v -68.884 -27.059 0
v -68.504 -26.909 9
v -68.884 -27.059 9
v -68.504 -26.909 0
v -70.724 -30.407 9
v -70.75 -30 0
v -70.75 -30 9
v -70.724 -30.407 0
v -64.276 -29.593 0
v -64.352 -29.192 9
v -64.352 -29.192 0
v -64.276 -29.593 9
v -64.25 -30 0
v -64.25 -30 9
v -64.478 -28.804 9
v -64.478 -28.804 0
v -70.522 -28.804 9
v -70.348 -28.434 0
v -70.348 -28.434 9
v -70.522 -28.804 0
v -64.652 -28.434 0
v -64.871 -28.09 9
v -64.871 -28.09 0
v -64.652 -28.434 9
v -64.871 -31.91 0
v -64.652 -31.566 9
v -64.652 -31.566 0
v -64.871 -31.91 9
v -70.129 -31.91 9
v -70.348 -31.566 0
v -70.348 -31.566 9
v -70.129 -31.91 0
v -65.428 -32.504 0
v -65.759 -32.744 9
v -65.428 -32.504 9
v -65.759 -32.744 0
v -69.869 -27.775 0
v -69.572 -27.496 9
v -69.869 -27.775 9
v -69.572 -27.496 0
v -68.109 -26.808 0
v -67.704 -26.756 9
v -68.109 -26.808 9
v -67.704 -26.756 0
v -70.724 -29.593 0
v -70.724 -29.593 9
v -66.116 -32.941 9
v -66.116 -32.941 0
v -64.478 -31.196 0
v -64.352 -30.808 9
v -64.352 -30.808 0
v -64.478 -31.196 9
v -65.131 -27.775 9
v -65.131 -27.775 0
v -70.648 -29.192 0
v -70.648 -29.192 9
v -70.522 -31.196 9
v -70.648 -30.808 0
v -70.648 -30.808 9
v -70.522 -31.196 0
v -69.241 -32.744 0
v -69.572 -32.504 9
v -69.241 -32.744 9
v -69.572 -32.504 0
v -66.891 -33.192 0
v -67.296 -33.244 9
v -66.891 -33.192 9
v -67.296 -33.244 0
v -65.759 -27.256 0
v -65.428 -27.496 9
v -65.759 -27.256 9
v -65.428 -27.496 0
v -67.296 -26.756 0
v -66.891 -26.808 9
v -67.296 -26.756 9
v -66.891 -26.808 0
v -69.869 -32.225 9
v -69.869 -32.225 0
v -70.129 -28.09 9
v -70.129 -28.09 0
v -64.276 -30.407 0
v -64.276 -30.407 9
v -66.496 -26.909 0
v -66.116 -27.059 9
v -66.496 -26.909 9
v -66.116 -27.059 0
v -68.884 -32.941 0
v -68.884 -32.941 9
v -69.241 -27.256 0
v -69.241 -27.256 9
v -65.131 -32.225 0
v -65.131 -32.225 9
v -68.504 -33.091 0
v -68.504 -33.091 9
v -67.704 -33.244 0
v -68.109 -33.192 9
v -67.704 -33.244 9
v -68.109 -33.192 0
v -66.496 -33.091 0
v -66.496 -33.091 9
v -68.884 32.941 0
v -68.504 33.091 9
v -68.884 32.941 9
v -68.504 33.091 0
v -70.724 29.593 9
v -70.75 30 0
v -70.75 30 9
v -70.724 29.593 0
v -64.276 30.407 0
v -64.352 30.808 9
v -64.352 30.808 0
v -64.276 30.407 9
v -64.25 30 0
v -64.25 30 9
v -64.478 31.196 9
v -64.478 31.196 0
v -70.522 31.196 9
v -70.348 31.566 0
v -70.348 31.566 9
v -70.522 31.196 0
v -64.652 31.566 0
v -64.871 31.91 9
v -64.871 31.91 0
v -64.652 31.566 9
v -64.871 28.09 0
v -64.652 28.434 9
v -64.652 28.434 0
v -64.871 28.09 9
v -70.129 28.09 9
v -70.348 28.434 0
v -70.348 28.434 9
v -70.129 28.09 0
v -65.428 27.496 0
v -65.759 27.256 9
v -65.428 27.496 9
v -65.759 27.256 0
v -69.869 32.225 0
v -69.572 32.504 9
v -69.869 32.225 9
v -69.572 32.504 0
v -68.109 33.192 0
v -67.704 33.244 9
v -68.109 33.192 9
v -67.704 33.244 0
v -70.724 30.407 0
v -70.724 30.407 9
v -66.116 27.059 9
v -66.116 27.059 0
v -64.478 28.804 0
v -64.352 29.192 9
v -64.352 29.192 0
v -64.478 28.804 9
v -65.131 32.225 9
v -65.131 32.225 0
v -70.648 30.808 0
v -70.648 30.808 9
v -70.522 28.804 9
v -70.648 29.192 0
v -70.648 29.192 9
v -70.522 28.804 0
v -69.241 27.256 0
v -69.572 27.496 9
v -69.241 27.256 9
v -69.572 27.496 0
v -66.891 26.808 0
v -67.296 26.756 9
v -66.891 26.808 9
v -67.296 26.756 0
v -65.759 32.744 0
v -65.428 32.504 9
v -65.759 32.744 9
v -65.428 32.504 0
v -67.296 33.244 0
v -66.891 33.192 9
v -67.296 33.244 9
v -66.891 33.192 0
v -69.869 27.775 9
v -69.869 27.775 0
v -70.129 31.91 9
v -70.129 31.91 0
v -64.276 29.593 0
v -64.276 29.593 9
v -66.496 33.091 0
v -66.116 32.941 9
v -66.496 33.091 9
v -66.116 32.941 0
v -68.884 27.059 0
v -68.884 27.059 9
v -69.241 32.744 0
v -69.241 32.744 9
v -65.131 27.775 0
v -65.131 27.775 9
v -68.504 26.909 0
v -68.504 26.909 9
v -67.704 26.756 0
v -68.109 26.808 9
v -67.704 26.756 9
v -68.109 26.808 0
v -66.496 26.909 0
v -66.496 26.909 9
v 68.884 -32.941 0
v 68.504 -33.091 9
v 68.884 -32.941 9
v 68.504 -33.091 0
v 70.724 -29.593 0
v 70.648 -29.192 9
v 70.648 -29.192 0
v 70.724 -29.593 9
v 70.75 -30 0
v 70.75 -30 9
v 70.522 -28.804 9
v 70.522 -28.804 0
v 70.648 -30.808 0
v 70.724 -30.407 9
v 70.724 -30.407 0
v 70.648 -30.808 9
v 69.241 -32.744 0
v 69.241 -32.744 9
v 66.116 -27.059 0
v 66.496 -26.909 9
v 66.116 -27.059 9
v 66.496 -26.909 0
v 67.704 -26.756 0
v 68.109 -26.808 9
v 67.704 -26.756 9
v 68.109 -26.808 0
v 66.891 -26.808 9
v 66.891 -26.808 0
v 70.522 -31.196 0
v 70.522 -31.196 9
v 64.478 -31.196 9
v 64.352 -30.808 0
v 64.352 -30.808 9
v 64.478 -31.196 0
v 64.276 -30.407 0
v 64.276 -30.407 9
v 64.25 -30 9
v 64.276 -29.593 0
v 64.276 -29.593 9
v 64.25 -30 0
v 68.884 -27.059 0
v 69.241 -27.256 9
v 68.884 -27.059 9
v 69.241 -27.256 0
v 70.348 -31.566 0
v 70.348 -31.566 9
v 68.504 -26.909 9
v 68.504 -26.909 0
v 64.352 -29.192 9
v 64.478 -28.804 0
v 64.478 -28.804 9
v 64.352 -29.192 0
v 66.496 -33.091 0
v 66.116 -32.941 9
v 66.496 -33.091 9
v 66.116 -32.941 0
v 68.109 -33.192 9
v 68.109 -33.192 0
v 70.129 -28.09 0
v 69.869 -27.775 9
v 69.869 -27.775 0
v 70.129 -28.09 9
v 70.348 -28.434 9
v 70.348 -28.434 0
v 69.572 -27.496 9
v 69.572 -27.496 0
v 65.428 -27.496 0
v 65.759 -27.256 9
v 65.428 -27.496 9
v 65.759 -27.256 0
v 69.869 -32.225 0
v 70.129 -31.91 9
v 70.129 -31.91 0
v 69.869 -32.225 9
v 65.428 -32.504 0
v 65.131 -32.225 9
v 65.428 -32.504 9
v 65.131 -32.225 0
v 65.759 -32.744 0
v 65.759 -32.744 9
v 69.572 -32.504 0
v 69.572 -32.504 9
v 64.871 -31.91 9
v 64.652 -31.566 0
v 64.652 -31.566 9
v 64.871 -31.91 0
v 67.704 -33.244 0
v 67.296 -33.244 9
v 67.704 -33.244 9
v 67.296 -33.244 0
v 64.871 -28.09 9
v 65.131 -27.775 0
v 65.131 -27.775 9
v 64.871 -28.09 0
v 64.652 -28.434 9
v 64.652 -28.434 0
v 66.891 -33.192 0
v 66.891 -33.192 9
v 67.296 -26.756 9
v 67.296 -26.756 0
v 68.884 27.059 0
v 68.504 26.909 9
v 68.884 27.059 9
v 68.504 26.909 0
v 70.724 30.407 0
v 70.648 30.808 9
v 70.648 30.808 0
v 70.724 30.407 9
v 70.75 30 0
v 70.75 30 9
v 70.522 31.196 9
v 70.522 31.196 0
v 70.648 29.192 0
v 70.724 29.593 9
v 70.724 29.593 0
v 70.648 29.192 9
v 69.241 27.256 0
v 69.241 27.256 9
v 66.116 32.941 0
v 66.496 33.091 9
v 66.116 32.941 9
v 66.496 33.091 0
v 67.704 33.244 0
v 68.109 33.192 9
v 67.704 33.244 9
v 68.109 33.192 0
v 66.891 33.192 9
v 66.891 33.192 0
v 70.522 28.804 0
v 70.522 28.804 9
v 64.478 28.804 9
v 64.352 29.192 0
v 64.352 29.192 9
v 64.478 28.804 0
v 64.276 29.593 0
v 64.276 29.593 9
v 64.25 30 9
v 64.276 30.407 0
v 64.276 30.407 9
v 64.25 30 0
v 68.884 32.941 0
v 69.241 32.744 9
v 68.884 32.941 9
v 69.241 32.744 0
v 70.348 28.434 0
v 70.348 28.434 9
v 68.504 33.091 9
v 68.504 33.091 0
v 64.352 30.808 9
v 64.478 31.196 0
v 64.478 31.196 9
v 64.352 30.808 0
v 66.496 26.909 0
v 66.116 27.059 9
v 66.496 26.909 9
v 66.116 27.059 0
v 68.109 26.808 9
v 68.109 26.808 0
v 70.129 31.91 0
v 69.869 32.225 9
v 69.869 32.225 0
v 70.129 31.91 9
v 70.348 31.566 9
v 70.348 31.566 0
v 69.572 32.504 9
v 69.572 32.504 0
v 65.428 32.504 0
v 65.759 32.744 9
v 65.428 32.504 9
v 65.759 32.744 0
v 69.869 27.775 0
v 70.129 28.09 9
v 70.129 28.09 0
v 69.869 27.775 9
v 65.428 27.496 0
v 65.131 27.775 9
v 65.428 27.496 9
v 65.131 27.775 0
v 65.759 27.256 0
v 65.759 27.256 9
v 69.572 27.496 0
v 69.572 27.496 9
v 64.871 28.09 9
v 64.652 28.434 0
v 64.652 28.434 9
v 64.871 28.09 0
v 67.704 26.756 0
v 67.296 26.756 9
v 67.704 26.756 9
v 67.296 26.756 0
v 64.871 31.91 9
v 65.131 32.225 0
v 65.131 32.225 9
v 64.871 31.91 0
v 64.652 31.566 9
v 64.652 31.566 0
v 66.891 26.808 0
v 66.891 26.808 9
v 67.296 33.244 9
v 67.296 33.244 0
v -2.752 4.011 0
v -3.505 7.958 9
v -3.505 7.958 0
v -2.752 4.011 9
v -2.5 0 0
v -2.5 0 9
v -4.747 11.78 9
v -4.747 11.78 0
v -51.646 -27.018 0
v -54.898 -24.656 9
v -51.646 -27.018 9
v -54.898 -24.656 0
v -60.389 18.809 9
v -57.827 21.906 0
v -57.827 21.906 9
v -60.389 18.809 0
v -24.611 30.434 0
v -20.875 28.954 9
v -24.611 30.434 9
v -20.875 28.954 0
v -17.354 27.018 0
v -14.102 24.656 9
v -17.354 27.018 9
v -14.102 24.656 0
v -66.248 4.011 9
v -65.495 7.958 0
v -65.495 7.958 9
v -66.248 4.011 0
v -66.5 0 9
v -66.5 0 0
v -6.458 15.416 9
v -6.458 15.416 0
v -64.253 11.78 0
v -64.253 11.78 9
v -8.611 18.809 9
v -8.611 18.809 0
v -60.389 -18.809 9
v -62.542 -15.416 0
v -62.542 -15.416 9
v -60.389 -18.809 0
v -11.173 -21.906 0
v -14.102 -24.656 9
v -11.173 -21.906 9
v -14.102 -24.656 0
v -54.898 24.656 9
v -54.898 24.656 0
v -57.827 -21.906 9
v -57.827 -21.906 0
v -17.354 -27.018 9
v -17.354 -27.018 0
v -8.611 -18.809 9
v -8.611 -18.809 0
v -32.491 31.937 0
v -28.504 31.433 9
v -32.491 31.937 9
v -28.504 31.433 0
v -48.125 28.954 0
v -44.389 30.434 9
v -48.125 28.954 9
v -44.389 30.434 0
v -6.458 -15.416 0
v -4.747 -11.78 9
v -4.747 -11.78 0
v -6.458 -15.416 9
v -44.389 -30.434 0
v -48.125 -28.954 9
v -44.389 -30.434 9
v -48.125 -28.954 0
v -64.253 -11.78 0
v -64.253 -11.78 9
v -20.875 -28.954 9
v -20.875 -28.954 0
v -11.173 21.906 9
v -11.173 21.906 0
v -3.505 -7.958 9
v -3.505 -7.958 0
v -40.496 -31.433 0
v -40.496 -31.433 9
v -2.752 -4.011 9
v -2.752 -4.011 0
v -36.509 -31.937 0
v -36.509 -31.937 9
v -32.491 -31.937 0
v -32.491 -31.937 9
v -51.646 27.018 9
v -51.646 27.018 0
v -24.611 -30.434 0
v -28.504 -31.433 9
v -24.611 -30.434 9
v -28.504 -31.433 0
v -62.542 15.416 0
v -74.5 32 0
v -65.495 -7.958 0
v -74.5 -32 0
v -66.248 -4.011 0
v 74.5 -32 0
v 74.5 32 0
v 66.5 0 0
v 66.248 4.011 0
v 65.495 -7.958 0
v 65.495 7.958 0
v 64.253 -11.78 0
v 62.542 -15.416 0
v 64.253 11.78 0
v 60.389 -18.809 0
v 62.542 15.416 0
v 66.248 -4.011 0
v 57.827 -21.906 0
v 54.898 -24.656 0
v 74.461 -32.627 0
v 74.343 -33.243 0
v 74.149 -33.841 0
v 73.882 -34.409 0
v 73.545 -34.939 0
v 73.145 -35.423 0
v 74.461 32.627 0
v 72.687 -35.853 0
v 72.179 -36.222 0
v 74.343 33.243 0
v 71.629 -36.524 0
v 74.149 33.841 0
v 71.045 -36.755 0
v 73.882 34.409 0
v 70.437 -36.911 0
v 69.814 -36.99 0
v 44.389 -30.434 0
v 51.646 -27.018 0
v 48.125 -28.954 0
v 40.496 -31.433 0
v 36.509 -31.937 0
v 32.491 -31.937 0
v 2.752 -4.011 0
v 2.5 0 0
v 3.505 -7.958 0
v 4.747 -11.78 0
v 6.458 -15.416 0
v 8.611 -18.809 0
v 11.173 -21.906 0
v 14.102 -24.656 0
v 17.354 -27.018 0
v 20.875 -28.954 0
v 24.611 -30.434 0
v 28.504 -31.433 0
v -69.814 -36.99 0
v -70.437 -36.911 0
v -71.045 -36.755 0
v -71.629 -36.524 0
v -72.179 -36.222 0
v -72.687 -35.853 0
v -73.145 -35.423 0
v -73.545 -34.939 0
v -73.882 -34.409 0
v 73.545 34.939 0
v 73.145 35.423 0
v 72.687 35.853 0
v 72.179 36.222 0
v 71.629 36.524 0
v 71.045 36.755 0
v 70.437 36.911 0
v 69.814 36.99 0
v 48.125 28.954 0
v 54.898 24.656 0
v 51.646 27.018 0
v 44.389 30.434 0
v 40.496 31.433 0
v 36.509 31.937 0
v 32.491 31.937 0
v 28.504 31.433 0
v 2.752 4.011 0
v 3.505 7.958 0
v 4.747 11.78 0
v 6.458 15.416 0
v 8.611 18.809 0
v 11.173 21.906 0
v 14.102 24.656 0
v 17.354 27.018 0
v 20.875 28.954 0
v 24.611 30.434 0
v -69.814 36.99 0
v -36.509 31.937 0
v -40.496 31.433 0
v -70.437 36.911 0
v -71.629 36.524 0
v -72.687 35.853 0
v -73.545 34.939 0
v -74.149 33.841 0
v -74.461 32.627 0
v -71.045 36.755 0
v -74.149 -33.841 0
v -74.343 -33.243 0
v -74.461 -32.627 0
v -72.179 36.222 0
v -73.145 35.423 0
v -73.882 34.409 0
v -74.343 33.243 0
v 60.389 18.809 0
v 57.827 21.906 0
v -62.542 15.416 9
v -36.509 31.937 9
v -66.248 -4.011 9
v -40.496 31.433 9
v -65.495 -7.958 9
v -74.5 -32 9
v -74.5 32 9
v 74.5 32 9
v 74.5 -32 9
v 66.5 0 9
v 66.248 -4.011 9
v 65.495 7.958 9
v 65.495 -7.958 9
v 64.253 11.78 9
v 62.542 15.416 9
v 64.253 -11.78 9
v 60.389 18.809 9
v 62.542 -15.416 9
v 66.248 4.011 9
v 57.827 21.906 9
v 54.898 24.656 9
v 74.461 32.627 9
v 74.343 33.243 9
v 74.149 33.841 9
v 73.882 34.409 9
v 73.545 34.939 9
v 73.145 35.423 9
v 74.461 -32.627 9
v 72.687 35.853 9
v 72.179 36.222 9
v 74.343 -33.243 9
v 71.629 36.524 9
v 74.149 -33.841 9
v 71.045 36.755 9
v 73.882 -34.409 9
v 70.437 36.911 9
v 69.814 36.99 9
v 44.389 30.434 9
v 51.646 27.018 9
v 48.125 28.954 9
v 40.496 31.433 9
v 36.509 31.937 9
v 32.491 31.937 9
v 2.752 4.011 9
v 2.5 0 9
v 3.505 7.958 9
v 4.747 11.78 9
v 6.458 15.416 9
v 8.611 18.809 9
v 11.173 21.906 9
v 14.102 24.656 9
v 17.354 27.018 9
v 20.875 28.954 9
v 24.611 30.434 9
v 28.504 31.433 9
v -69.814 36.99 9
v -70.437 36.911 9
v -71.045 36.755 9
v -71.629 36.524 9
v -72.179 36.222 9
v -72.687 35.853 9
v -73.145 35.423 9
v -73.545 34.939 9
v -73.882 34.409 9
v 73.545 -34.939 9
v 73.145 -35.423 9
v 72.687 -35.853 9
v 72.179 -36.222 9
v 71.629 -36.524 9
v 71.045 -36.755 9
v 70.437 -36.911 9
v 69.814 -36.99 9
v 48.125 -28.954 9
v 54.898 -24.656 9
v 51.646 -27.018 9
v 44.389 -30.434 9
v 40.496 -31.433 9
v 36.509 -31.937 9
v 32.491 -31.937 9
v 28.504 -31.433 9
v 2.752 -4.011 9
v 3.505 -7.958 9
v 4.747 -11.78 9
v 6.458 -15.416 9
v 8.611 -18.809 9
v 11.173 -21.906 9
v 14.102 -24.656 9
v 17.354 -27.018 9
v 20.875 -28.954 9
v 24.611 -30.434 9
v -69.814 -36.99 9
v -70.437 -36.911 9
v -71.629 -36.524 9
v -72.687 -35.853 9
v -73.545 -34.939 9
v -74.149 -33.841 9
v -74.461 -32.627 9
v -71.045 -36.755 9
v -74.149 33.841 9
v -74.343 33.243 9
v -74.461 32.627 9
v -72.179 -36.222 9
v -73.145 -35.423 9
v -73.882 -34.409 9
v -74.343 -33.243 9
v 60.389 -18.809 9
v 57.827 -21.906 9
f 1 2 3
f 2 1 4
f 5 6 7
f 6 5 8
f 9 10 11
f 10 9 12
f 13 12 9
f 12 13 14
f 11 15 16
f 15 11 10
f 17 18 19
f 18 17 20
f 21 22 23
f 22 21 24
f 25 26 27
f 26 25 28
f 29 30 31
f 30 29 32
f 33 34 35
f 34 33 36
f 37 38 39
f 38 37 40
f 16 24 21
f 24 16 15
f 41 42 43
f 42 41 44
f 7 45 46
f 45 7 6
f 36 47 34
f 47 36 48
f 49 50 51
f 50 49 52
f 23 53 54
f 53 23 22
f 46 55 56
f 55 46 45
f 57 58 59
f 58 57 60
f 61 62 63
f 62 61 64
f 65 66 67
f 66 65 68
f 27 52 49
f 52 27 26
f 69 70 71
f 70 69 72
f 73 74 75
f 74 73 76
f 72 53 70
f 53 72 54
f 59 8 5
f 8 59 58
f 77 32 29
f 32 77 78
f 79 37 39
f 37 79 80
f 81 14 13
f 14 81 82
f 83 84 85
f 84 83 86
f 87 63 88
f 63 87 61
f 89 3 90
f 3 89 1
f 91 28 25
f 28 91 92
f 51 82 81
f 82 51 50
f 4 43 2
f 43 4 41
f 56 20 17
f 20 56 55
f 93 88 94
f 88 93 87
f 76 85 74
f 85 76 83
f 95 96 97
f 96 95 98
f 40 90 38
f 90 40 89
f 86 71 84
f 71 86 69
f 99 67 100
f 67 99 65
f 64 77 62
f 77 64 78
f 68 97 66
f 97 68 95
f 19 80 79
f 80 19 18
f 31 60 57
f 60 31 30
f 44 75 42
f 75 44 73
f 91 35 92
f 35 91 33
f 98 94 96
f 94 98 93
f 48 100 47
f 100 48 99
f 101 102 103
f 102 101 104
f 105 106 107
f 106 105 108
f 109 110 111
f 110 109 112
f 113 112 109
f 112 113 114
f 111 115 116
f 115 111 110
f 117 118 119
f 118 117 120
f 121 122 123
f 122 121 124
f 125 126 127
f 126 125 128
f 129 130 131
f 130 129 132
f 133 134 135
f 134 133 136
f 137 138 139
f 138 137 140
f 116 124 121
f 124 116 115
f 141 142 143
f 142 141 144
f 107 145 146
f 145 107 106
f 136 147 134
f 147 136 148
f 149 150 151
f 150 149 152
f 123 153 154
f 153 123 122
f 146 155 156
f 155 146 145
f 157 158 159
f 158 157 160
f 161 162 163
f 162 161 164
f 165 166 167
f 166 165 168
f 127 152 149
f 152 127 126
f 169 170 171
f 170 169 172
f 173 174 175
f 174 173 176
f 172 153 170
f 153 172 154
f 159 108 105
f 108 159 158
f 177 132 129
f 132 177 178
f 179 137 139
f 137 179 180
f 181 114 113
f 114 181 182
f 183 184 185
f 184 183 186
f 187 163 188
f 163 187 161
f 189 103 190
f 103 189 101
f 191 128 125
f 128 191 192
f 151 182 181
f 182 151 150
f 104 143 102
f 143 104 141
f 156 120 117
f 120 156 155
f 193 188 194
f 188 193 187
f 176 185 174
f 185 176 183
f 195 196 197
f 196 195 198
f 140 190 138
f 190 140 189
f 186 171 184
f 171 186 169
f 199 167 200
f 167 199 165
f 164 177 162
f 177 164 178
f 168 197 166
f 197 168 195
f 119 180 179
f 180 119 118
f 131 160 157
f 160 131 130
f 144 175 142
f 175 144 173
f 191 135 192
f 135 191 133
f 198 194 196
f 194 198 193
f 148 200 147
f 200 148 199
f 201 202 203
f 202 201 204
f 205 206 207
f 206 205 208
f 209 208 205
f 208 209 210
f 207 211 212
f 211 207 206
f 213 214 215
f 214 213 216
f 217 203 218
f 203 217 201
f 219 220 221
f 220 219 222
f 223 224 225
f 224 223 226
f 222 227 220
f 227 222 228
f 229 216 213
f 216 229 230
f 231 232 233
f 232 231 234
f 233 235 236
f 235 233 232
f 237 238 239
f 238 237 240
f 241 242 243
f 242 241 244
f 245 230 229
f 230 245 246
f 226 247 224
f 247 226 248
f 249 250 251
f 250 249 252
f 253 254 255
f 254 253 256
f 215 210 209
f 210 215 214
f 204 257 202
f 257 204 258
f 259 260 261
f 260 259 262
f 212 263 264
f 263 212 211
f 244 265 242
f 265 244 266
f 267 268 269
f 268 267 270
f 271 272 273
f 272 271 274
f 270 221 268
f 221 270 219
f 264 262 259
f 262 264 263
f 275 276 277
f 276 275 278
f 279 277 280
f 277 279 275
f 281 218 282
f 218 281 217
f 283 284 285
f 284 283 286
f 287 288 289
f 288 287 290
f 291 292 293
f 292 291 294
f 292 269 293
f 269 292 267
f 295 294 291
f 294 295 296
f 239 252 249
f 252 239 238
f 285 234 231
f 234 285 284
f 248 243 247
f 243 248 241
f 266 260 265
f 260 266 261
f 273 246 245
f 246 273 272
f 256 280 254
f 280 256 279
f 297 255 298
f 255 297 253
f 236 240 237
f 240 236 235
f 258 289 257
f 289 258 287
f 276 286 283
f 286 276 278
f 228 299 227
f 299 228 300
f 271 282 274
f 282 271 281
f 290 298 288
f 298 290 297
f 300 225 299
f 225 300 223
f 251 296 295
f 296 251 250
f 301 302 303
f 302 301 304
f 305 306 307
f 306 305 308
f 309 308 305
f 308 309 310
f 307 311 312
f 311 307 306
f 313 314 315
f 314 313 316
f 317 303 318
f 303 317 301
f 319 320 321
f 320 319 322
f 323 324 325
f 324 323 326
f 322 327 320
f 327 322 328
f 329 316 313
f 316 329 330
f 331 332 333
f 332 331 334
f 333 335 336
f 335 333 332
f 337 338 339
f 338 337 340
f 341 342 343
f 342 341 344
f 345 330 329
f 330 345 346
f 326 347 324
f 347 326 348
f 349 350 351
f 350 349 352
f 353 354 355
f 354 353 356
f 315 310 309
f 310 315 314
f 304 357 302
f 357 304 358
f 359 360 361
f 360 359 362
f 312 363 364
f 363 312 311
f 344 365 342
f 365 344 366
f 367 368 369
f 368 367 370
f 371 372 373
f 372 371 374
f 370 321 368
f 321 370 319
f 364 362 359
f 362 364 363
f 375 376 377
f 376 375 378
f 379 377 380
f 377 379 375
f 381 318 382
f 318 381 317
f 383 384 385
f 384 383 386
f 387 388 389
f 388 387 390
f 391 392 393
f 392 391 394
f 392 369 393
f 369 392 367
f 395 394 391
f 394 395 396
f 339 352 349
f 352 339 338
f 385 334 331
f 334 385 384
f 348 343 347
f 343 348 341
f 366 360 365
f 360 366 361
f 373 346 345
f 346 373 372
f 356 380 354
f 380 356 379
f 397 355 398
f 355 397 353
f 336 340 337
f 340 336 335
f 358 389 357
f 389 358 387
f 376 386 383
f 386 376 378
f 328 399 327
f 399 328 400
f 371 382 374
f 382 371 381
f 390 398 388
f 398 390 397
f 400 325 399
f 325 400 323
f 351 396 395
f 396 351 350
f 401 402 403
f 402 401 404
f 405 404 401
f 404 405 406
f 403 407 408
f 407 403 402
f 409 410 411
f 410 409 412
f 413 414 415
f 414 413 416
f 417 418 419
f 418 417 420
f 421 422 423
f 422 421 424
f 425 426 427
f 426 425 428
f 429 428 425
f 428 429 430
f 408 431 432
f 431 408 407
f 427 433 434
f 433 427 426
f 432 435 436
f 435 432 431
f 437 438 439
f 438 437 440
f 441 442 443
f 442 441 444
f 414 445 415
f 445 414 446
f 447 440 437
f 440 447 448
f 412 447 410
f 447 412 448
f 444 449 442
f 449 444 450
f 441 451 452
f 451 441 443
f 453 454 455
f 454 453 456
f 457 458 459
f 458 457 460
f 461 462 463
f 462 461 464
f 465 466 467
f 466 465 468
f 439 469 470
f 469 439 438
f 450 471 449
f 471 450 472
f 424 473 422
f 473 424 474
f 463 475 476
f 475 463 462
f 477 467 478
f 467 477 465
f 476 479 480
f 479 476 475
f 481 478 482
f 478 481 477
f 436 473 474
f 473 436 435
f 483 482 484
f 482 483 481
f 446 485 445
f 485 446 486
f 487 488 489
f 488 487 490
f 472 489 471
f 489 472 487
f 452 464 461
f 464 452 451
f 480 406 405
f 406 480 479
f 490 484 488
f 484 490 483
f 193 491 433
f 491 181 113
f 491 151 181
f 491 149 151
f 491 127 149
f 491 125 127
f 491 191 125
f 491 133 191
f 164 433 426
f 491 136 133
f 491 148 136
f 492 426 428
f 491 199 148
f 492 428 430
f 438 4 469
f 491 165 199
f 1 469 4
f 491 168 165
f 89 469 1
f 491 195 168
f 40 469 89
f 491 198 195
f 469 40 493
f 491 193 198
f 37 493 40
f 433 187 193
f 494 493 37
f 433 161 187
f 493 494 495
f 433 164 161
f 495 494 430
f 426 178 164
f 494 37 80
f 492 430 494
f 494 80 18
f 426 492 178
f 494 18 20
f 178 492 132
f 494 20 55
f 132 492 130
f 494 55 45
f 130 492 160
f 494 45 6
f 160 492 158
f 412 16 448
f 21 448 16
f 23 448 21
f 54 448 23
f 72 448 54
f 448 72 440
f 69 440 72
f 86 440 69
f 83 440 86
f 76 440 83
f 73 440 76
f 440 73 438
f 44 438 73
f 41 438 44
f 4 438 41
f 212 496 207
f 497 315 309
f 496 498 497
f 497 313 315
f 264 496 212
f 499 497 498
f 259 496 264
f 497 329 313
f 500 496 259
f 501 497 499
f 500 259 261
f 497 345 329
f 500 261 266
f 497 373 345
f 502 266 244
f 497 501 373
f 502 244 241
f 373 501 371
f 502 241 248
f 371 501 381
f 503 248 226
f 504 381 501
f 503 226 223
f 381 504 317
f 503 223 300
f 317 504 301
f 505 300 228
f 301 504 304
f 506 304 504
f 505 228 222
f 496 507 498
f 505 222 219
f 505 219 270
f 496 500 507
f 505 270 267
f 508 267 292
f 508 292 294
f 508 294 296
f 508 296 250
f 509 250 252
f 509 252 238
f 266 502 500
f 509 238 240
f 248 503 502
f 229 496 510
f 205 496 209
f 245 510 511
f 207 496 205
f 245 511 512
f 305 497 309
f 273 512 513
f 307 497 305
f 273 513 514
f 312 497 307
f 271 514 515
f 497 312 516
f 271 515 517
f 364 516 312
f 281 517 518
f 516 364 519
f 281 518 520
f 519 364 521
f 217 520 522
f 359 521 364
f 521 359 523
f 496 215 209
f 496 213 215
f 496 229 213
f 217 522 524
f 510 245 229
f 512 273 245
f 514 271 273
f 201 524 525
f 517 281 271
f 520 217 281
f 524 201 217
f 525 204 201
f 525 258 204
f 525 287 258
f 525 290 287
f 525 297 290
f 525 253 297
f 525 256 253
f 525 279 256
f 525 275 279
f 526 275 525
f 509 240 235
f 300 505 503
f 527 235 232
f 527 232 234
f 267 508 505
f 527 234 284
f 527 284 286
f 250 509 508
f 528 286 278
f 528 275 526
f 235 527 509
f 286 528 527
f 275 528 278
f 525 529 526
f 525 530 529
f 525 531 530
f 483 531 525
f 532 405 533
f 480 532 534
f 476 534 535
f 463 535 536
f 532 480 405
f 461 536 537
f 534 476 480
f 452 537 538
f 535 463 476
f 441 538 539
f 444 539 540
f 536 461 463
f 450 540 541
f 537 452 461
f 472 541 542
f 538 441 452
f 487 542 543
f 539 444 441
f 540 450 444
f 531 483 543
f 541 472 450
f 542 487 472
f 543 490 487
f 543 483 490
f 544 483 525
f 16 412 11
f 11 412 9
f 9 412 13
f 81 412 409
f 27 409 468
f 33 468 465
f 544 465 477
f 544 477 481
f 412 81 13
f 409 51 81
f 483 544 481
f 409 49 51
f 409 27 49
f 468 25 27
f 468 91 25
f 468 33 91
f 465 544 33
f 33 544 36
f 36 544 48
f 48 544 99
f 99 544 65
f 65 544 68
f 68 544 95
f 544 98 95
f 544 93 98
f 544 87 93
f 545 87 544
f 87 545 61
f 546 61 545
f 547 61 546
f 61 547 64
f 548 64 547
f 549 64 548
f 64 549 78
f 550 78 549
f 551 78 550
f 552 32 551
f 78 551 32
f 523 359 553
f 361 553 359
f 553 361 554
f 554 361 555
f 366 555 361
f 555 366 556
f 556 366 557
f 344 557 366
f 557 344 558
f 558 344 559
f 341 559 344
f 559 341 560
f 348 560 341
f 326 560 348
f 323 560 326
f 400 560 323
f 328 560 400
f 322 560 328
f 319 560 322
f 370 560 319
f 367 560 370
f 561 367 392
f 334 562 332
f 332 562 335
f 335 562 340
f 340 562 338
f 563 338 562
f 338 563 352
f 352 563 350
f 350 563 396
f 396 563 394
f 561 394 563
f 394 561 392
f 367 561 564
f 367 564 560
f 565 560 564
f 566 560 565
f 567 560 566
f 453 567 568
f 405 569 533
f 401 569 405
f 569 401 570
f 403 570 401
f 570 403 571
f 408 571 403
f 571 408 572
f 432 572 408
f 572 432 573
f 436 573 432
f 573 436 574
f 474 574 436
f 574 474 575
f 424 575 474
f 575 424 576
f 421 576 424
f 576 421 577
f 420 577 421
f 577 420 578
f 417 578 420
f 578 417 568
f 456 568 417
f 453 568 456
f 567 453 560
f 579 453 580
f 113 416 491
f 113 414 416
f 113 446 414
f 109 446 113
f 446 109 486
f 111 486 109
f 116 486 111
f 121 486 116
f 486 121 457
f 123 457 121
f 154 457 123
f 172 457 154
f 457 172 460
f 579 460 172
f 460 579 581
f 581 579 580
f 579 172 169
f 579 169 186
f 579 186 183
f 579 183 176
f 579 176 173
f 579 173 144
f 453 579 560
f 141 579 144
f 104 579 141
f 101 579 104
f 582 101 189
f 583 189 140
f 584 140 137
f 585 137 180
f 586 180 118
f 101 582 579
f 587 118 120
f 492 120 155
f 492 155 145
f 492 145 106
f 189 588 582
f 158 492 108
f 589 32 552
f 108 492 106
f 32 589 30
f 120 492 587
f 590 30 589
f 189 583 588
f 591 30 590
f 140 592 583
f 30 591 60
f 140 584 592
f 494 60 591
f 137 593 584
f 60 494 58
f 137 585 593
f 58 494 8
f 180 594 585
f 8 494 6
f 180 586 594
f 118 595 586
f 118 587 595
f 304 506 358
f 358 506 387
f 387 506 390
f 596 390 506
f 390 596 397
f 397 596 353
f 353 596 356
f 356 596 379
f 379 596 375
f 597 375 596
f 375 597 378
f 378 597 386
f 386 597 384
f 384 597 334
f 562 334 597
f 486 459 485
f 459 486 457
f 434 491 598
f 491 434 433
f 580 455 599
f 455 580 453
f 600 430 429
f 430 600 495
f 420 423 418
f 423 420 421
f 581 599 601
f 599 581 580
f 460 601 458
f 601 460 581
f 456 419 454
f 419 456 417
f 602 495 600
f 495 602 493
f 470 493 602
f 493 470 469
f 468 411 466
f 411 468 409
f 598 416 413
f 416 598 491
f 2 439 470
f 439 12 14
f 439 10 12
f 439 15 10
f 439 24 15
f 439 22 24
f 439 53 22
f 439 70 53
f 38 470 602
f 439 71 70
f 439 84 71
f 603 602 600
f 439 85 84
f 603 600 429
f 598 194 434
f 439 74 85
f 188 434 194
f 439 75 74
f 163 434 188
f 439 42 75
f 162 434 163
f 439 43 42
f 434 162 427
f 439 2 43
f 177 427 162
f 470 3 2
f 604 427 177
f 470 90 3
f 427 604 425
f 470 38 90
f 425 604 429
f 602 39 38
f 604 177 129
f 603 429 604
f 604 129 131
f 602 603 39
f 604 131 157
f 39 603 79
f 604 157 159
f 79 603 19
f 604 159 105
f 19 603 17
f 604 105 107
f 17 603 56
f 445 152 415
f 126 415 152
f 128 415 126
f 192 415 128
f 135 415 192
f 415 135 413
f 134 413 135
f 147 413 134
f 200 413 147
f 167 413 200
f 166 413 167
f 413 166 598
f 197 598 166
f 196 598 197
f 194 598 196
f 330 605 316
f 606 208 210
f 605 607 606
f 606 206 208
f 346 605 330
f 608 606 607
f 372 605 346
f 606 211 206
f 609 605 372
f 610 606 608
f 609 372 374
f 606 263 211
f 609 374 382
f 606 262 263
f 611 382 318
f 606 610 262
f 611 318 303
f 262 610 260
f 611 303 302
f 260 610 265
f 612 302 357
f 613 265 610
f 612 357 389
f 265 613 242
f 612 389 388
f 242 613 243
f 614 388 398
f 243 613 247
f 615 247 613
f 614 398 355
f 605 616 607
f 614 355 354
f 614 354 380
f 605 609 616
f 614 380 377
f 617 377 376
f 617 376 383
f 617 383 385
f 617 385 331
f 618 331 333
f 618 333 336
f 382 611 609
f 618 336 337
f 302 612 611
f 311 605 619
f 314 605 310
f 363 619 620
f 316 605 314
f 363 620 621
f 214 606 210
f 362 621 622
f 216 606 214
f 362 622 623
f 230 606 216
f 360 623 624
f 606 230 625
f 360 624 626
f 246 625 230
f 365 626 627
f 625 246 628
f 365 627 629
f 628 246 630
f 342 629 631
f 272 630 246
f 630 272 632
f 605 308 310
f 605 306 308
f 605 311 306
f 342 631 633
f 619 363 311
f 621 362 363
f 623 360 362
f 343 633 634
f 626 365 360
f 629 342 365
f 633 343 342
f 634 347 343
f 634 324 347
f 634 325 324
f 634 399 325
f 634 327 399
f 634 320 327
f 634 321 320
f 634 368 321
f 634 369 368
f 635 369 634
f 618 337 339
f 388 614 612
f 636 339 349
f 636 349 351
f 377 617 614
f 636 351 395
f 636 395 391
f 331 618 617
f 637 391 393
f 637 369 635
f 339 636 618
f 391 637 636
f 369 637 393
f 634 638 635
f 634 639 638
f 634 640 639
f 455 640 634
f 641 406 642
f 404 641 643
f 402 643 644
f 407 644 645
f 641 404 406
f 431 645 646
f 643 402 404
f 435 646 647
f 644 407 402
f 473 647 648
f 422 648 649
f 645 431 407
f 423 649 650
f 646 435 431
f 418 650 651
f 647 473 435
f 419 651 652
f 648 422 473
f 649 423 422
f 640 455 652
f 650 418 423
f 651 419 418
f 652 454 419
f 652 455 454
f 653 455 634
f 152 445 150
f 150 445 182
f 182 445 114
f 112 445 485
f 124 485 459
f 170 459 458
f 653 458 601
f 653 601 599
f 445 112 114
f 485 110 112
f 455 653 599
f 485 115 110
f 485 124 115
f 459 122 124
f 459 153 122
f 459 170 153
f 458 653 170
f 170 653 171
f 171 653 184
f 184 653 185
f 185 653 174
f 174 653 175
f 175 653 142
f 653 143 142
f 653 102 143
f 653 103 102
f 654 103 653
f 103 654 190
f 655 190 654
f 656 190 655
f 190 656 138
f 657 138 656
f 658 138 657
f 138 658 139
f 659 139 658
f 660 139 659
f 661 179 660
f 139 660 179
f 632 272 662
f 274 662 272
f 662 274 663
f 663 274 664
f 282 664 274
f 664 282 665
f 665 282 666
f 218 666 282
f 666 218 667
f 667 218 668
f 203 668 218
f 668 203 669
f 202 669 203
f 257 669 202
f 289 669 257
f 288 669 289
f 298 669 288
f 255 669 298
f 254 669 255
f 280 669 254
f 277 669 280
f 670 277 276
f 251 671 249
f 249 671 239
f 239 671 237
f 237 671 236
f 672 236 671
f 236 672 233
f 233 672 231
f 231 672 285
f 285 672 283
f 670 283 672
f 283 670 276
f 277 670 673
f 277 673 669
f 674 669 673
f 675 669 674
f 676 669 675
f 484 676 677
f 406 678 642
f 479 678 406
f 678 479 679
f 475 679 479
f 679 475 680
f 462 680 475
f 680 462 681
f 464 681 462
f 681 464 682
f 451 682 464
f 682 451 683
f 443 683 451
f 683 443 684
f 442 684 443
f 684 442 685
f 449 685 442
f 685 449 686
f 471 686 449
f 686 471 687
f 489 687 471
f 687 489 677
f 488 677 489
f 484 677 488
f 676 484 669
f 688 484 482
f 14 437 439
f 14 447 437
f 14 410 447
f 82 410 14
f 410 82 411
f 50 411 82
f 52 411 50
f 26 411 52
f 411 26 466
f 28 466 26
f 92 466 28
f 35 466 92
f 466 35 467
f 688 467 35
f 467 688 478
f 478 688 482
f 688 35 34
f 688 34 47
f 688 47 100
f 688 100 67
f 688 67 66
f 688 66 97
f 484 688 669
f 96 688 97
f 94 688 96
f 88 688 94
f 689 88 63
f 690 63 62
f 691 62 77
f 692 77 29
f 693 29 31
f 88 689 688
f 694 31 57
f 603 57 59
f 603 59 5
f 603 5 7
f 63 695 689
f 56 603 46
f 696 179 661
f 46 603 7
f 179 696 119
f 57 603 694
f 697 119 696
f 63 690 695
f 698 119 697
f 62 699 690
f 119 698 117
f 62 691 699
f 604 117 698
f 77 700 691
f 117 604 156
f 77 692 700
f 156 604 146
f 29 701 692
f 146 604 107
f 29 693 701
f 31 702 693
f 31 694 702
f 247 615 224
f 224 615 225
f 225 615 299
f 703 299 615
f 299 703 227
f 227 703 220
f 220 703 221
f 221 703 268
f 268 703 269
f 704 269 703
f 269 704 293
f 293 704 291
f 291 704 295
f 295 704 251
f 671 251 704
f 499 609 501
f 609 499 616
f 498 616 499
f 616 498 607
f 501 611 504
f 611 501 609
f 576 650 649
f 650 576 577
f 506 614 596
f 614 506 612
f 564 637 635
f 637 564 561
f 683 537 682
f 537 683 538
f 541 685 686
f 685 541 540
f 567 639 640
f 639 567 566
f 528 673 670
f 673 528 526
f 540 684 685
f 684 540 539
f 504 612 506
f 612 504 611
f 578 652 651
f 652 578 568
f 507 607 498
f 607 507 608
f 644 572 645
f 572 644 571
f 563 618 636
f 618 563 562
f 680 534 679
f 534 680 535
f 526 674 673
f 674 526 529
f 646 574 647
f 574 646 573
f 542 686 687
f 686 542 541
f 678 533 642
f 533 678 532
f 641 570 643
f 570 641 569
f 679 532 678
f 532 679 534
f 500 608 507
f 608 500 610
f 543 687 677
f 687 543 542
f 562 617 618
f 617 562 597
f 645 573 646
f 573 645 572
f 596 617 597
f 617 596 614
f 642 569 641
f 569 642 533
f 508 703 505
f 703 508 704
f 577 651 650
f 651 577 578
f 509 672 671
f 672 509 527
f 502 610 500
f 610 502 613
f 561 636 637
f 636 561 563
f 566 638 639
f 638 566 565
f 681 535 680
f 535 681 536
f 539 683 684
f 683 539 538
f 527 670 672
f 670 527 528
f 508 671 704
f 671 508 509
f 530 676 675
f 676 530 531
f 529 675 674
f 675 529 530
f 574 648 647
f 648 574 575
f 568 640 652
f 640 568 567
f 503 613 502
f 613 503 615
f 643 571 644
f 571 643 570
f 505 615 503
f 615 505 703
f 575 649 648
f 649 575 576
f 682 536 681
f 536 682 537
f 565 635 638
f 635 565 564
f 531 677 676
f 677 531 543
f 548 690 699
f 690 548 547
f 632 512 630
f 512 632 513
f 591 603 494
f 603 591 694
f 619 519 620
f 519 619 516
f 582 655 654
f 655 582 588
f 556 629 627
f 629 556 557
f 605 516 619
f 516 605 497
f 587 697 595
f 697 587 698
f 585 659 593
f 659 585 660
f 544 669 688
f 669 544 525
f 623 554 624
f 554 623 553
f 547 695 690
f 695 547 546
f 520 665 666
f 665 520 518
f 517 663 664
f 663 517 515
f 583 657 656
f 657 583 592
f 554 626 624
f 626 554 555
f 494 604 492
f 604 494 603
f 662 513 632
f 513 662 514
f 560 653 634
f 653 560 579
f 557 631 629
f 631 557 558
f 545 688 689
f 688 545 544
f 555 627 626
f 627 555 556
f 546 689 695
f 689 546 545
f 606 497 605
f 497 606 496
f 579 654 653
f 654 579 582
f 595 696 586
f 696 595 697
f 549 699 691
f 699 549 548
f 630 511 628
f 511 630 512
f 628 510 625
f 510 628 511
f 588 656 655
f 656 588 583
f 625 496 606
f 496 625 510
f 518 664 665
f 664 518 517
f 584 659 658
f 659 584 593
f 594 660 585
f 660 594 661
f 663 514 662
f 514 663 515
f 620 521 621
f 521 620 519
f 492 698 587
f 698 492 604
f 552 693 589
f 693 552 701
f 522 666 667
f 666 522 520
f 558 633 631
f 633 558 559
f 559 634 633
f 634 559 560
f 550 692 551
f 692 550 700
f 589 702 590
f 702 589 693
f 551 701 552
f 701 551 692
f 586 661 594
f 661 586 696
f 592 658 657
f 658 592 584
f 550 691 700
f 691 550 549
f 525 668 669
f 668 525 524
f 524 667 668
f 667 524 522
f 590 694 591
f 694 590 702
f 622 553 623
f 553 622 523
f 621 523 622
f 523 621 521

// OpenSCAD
$fn = 50;


difference() {
	union() {
		hull() {
			translate(v = [-69.5000000000, 32.0000000000, 0]) {
				cylinder(h = 9, r = 5);
			}
			translate(v = [69.5000000000, 32.0000000000, 0]) {
				cylinder(h = 9, r = 5);
			}
			translate(v = [-69.5000000000, -32.0000000000, 0]) {
				cylinder(h = 9, r = 5);
			}
			translate(v = [69.5000000000, -32.0000000000, 0]) {
				cylinder(h = 9, r = 5);
			}
		}
	}
	union() {
		#translate(v = [-67.5000000000, -30.0000000000, -100.0000000000]) {
			cylinder(h = 200, r = 3.2500000000);
		}
		#translate(v = [-67.5000000000, 30.0000000000, -100.0000000000]) {
			cylinder(h = 200, r = 3.2500000000);
		}
		#translate(v = [67.5000000000, -30.0000000000, -100.0000000000]) {
			cylinder(h = 200, r = 3.2500000000);
		}
		#translate(v = [67.5000000000, 30.0000000000, -100.0000000000]) {
			cylinder(h = 200, r = 3.2500000000);
		}
		#translate(v = [-34.5000000000, 0, 0]) {
			cylinder(h = 9, r = 32.0000000000);
		}
		#translate(v = [34.5000000000, 0, 0]) {
			cylinder(h = 9, r = 32.0000000000);
		}
	}
}
